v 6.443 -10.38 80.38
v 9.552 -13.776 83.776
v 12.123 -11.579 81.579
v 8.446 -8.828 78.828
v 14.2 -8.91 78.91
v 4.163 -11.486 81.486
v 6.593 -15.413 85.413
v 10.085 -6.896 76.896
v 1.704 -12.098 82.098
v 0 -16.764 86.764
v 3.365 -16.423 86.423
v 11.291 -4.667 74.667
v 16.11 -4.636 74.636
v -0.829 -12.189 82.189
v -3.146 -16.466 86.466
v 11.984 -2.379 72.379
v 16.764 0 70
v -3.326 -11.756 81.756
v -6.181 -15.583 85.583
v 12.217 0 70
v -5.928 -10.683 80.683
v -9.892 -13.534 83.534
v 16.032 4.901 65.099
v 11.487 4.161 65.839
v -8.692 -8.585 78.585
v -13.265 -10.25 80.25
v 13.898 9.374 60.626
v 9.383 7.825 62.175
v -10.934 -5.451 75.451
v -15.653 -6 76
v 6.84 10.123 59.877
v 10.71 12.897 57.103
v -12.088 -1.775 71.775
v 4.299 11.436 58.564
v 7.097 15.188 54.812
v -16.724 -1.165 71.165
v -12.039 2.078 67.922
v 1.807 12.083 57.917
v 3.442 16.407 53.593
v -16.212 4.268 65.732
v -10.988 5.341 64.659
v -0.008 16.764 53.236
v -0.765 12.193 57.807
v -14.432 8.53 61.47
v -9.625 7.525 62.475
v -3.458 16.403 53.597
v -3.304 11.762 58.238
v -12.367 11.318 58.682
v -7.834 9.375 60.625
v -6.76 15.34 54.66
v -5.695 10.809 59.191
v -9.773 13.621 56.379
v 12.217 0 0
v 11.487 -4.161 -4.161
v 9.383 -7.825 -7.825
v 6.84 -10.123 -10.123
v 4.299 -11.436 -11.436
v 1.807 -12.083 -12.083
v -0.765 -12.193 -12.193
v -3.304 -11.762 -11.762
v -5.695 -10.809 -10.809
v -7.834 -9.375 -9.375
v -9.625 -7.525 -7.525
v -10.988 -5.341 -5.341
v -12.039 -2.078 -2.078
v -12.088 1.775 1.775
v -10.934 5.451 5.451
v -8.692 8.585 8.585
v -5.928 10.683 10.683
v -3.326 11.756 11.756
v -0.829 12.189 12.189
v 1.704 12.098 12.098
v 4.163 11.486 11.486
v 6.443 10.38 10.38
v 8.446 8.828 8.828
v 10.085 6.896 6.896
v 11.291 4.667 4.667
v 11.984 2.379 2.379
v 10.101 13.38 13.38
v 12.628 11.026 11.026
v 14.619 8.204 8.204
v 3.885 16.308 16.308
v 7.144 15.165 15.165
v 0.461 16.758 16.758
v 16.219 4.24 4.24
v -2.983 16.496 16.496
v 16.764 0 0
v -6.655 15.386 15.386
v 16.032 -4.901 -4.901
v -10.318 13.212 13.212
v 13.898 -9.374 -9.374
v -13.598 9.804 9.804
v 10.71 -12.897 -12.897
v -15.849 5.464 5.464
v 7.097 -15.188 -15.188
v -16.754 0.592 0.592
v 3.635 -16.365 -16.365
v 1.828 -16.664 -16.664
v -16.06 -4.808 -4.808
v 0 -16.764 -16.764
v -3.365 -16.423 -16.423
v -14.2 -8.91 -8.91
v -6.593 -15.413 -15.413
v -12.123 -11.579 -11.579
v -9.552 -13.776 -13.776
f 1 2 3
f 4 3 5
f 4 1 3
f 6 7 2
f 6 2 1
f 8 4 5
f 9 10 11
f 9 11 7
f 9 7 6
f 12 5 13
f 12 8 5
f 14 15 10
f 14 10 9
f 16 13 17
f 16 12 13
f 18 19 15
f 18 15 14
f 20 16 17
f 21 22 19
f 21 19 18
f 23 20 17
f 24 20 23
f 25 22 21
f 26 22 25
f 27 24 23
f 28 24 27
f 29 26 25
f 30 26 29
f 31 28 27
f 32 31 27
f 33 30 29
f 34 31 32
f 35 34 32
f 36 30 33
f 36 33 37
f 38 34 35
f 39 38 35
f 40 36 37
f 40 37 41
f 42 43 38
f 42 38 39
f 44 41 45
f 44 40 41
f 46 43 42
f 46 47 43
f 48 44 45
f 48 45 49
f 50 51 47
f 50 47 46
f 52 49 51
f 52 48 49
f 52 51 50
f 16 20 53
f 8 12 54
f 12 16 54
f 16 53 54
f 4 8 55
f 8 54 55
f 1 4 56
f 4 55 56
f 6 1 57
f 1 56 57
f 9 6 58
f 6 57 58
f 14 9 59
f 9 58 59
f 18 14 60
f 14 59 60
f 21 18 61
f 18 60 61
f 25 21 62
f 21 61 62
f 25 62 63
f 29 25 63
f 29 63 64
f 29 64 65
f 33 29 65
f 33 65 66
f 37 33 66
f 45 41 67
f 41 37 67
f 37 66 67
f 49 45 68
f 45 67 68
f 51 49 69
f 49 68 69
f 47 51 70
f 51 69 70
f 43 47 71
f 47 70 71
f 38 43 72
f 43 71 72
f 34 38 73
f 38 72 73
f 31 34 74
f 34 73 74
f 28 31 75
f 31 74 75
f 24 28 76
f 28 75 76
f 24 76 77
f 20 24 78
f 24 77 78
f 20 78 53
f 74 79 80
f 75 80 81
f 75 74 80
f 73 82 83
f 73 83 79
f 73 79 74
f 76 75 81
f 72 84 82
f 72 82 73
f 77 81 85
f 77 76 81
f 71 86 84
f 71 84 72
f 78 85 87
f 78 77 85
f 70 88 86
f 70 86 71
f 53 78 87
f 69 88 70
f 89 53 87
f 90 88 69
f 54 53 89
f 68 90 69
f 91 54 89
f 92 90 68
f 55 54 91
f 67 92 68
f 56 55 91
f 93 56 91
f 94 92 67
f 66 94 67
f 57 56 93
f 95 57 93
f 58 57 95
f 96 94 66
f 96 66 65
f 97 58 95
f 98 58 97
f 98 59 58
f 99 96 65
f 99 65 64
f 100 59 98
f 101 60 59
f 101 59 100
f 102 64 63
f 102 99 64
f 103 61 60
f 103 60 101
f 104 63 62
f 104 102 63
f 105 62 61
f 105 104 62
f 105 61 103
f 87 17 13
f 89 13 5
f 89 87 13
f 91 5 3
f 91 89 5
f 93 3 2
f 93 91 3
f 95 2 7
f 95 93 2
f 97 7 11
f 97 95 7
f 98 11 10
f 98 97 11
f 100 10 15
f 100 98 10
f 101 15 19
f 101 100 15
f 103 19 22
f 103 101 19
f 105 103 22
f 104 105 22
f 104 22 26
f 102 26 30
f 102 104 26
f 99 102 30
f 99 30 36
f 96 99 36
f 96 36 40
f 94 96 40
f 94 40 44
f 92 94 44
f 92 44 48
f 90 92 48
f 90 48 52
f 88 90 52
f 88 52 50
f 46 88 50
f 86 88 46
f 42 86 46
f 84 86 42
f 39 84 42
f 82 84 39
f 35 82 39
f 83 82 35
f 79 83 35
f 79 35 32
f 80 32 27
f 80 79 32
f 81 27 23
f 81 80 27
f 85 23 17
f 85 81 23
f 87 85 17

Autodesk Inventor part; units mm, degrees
ref_plane "Start Plane" through (0, 0, -16.764) normal (0, 0, 1) x (1, 0, 0)
ref_plane "End Plane" through (0, 0, 86.764) normal (0, 0, 1) x (1, 0, 0)
sketch "Sketch" plane through (0, 0, 0) normal (0, 0, 1) x (1, 0, 0)
  circle A0 centre (0, 0) radius 12.2174
  circle A1 centre (0, 0) radius 16.764
  dimension "d0" = 33.528
  dimension "d1" = 4.5466
extrude "Body" add sketch "Sketch" along normal up to surface (103.528 mm away) from surface at -16.764
sketch "Sketch3" plane through (0, 0, 0) normal (0, 0, 1) x (1, 0, 0)
  line L0 (0, 0) -> (10, 0)
ref_plane "Work Plane3" through (0, 0, 0) normal (0, -1, 0) x (1, 0, 0)
ref_plane "Work Plane4" through (0, -16.764, -16.764) normal (0, 0.7071, -0.7071) x (1, 0, 0)
split "Split1" plane through (0, -16.764, -16.764) removes the side toward (0, 0.7071, -0.7071)
ref_plane "Work Plane5" through (0, -16.764, 86.764) normal (0, 0.7071, 0.7071) x (1, 0, 0)
split "Split2" plane through (0, -16.764, 86.764) removes the side toward (0, 0.7071, 0.7071)
sketch "Sketch4" plane through (0, 0, 0) normal (0, -1, 0) x (1, 0, 0)
  line L0 (-2, -16.764) -> (12, -16.764) projected
  line L1 (-2, 86.764) -> (12, 86.764) projected
  dimension "d7" = 103.528
equation "\"d0\" = G_H"
equation "\"d1\" = G_T"
equation "\"d2\" = G_L"
equation "\"G_H\" = 33.528"
equation "\"G_T\" = 4.5466"
equation "\"G_L\" = d7"
equation "\"G_OFFSET_START\" = 16.764"
equation "\"G_OFFSET_END\" = 16.764"
equation "\"d4\" = -G_OFFSET_START"
equation "\"d5\" = G_OFFSET_END + B_L"
equation "\"B_L\" = 70"
properties part number "ANSI - 1 x 0.179 - 4.076" material "Steel, Mild"
